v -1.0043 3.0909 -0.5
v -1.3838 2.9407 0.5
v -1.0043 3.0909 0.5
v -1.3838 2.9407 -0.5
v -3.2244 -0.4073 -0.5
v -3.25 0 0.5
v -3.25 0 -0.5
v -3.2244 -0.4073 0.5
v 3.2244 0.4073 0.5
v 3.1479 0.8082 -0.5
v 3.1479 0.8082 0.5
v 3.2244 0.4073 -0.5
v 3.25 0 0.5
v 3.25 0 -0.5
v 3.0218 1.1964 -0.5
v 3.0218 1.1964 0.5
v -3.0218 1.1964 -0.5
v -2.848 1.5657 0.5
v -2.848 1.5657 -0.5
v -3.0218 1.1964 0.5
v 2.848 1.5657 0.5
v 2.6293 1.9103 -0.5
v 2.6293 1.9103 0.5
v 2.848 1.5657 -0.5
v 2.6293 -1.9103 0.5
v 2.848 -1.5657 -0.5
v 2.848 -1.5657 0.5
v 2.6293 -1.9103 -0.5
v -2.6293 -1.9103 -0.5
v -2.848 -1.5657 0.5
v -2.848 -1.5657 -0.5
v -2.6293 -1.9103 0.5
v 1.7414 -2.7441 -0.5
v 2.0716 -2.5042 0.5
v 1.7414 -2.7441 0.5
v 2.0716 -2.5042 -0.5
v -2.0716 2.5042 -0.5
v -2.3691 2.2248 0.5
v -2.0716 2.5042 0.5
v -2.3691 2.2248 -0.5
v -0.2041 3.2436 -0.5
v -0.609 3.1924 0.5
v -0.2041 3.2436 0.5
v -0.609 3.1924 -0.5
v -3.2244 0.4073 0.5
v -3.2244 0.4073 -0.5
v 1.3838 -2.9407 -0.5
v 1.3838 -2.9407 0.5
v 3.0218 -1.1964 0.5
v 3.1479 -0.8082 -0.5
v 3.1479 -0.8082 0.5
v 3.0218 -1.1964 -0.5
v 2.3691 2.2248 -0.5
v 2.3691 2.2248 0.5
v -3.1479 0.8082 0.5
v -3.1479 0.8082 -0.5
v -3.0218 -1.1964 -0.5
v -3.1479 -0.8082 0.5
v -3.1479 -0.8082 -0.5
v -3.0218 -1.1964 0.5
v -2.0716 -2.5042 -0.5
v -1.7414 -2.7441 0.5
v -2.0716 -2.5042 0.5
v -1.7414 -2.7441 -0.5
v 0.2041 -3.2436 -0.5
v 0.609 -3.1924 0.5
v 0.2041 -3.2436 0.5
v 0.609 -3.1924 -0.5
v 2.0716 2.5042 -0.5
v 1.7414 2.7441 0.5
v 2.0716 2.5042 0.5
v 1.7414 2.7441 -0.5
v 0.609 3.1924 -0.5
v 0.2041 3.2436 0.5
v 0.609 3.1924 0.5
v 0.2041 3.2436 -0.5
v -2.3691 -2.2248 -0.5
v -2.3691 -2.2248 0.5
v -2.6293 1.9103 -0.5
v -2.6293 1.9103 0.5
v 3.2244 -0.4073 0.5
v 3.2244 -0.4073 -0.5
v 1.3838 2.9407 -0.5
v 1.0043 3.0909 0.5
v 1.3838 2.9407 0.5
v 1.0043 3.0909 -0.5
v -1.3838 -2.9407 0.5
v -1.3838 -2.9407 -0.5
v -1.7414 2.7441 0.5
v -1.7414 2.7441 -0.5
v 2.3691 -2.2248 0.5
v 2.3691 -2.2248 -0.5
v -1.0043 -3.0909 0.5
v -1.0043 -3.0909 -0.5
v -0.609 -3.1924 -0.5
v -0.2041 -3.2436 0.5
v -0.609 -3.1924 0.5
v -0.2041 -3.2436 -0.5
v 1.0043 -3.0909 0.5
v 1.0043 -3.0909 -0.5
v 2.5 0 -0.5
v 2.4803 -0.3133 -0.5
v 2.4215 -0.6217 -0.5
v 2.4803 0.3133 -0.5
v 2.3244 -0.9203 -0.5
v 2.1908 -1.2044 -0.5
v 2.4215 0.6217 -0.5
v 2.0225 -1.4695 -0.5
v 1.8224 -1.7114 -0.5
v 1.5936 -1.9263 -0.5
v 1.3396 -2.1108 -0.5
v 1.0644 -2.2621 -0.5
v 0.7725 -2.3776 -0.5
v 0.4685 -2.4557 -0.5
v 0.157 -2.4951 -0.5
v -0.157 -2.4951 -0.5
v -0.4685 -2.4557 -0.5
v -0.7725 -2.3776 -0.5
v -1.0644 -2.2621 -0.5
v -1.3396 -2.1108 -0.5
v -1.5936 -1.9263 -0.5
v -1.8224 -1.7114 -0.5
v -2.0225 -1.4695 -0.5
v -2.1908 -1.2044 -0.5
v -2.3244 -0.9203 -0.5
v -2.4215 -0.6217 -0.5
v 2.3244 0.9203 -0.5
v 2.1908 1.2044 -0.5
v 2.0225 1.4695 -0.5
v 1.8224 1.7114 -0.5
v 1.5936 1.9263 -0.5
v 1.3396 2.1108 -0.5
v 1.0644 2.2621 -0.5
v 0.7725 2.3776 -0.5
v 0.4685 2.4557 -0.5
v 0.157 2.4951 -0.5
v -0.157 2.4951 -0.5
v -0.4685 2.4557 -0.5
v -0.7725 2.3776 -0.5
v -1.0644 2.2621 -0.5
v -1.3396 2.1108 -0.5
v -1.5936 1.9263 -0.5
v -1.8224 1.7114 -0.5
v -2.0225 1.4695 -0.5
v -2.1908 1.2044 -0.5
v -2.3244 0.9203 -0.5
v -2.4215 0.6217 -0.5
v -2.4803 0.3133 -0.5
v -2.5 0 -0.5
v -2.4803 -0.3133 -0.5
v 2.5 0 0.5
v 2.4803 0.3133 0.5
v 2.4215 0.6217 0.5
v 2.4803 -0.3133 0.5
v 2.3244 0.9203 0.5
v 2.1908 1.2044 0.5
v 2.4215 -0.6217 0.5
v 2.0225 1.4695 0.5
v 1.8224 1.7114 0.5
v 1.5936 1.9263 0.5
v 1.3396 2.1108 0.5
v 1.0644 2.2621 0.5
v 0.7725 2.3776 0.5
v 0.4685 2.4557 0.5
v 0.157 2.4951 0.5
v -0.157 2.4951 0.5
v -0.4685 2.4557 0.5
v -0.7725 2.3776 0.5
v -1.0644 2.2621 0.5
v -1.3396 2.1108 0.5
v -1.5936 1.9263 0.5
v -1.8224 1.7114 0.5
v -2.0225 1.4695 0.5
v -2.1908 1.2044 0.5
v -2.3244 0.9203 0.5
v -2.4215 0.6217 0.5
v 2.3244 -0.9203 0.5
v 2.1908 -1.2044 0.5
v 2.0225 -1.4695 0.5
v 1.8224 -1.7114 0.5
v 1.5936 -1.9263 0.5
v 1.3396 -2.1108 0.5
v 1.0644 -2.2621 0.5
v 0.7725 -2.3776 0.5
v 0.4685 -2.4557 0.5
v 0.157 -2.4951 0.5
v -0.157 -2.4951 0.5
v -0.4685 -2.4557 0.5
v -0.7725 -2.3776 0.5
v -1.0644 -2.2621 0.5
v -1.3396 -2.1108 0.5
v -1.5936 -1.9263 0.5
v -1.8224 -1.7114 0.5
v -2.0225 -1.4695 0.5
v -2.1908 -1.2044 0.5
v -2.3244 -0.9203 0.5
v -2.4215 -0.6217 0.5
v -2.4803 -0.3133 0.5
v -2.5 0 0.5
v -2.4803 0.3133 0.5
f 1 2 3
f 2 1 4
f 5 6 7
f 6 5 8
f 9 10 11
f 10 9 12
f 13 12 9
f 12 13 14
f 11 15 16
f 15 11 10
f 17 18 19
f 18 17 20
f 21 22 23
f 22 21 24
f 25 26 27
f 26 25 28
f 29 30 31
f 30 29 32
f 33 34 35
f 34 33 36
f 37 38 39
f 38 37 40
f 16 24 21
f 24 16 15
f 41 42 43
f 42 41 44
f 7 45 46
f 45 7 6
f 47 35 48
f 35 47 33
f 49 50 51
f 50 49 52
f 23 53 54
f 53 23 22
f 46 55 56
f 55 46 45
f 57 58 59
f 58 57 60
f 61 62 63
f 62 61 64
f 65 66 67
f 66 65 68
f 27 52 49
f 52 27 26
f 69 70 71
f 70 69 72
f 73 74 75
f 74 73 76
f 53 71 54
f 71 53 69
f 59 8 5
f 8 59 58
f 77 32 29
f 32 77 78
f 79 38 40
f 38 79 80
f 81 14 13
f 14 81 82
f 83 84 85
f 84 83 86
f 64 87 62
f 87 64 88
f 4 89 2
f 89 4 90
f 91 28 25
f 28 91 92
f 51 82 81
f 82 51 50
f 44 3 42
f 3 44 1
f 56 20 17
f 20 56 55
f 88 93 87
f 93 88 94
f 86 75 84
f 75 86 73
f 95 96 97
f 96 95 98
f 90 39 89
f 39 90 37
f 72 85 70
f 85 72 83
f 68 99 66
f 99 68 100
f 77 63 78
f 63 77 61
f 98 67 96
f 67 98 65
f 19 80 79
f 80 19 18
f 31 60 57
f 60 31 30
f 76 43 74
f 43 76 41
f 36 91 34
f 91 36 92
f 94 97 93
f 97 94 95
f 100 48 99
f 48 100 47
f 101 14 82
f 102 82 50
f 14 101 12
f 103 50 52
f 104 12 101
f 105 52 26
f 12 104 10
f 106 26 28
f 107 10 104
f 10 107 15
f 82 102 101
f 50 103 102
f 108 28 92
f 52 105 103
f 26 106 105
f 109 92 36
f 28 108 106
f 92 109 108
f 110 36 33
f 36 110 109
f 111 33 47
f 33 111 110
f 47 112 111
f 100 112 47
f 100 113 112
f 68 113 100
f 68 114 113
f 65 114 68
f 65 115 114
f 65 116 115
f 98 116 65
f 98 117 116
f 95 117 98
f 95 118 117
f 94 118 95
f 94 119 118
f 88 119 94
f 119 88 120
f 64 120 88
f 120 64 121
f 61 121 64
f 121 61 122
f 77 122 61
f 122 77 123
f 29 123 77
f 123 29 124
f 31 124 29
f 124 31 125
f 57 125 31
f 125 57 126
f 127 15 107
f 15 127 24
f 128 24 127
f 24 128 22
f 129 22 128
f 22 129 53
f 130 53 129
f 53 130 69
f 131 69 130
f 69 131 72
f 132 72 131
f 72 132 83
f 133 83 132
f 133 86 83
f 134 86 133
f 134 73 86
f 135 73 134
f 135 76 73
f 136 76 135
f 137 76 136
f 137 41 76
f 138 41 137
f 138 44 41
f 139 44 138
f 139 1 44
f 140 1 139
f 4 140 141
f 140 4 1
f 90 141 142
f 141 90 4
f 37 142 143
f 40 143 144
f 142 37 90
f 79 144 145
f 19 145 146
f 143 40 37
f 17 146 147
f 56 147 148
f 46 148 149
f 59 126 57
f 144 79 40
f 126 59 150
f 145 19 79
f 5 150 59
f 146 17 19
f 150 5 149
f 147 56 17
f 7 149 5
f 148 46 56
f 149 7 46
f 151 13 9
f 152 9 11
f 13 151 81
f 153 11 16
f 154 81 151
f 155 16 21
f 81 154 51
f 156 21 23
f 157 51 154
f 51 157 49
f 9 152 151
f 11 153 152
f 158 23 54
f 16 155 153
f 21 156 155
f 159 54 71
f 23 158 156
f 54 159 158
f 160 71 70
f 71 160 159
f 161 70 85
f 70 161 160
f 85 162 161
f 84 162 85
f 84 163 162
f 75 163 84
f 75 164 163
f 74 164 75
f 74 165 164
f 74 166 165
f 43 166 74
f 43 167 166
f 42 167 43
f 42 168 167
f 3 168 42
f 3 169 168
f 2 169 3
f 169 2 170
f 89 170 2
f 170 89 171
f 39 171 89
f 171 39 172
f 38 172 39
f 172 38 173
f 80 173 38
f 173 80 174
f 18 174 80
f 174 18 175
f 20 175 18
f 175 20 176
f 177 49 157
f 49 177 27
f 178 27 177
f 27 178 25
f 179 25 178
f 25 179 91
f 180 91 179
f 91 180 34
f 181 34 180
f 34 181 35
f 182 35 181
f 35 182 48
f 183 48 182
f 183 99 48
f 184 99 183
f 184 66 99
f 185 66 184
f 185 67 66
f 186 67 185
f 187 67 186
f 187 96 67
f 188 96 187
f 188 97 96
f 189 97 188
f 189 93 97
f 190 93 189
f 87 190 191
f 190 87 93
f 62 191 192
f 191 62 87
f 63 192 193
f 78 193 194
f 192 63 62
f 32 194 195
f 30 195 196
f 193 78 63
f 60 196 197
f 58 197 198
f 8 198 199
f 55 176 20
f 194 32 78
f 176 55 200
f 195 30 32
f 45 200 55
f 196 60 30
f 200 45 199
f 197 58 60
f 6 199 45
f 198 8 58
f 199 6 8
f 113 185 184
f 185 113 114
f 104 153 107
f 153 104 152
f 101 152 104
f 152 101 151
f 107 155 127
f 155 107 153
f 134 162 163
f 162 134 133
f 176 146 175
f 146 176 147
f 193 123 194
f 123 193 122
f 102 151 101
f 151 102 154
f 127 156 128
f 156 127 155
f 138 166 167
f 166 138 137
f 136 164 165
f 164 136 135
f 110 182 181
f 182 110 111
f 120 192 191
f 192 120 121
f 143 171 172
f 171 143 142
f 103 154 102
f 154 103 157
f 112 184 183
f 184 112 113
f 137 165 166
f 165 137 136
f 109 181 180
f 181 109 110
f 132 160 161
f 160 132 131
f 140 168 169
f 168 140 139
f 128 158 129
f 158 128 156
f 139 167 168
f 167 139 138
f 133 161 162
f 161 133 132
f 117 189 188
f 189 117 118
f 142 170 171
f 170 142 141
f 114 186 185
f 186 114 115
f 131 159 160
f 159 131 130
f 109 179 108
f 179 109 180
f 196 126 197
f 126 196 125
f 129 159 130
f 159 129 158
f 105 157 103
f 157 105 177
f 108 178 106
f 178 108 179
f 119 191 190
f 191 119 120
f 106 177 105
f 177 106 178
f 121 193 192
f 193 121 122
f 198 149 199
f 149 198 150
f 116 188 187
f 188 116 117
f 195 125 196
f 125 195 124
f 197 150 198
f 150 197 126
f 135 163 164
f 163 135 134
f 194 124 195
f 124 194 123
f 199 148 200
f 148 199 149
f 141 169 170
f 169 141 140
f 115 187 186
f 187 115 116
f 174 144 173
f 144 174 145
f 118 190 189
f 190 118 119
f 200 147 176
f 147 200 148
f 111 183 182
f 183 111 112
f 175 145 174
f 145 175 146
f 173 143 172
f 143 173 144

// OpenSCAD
$fn = 50;


difference() {
	union() {
		translate(v = [0, 0, -0.5000000000]) {
			cylinder(h = 1, r = 3.2500000000);
		}
	}
	union() {
		translate(v = [0, 0, -100.0000000000]) {
			cylinder(h = 200, r = 2.5000000000);
		}
	}
}
